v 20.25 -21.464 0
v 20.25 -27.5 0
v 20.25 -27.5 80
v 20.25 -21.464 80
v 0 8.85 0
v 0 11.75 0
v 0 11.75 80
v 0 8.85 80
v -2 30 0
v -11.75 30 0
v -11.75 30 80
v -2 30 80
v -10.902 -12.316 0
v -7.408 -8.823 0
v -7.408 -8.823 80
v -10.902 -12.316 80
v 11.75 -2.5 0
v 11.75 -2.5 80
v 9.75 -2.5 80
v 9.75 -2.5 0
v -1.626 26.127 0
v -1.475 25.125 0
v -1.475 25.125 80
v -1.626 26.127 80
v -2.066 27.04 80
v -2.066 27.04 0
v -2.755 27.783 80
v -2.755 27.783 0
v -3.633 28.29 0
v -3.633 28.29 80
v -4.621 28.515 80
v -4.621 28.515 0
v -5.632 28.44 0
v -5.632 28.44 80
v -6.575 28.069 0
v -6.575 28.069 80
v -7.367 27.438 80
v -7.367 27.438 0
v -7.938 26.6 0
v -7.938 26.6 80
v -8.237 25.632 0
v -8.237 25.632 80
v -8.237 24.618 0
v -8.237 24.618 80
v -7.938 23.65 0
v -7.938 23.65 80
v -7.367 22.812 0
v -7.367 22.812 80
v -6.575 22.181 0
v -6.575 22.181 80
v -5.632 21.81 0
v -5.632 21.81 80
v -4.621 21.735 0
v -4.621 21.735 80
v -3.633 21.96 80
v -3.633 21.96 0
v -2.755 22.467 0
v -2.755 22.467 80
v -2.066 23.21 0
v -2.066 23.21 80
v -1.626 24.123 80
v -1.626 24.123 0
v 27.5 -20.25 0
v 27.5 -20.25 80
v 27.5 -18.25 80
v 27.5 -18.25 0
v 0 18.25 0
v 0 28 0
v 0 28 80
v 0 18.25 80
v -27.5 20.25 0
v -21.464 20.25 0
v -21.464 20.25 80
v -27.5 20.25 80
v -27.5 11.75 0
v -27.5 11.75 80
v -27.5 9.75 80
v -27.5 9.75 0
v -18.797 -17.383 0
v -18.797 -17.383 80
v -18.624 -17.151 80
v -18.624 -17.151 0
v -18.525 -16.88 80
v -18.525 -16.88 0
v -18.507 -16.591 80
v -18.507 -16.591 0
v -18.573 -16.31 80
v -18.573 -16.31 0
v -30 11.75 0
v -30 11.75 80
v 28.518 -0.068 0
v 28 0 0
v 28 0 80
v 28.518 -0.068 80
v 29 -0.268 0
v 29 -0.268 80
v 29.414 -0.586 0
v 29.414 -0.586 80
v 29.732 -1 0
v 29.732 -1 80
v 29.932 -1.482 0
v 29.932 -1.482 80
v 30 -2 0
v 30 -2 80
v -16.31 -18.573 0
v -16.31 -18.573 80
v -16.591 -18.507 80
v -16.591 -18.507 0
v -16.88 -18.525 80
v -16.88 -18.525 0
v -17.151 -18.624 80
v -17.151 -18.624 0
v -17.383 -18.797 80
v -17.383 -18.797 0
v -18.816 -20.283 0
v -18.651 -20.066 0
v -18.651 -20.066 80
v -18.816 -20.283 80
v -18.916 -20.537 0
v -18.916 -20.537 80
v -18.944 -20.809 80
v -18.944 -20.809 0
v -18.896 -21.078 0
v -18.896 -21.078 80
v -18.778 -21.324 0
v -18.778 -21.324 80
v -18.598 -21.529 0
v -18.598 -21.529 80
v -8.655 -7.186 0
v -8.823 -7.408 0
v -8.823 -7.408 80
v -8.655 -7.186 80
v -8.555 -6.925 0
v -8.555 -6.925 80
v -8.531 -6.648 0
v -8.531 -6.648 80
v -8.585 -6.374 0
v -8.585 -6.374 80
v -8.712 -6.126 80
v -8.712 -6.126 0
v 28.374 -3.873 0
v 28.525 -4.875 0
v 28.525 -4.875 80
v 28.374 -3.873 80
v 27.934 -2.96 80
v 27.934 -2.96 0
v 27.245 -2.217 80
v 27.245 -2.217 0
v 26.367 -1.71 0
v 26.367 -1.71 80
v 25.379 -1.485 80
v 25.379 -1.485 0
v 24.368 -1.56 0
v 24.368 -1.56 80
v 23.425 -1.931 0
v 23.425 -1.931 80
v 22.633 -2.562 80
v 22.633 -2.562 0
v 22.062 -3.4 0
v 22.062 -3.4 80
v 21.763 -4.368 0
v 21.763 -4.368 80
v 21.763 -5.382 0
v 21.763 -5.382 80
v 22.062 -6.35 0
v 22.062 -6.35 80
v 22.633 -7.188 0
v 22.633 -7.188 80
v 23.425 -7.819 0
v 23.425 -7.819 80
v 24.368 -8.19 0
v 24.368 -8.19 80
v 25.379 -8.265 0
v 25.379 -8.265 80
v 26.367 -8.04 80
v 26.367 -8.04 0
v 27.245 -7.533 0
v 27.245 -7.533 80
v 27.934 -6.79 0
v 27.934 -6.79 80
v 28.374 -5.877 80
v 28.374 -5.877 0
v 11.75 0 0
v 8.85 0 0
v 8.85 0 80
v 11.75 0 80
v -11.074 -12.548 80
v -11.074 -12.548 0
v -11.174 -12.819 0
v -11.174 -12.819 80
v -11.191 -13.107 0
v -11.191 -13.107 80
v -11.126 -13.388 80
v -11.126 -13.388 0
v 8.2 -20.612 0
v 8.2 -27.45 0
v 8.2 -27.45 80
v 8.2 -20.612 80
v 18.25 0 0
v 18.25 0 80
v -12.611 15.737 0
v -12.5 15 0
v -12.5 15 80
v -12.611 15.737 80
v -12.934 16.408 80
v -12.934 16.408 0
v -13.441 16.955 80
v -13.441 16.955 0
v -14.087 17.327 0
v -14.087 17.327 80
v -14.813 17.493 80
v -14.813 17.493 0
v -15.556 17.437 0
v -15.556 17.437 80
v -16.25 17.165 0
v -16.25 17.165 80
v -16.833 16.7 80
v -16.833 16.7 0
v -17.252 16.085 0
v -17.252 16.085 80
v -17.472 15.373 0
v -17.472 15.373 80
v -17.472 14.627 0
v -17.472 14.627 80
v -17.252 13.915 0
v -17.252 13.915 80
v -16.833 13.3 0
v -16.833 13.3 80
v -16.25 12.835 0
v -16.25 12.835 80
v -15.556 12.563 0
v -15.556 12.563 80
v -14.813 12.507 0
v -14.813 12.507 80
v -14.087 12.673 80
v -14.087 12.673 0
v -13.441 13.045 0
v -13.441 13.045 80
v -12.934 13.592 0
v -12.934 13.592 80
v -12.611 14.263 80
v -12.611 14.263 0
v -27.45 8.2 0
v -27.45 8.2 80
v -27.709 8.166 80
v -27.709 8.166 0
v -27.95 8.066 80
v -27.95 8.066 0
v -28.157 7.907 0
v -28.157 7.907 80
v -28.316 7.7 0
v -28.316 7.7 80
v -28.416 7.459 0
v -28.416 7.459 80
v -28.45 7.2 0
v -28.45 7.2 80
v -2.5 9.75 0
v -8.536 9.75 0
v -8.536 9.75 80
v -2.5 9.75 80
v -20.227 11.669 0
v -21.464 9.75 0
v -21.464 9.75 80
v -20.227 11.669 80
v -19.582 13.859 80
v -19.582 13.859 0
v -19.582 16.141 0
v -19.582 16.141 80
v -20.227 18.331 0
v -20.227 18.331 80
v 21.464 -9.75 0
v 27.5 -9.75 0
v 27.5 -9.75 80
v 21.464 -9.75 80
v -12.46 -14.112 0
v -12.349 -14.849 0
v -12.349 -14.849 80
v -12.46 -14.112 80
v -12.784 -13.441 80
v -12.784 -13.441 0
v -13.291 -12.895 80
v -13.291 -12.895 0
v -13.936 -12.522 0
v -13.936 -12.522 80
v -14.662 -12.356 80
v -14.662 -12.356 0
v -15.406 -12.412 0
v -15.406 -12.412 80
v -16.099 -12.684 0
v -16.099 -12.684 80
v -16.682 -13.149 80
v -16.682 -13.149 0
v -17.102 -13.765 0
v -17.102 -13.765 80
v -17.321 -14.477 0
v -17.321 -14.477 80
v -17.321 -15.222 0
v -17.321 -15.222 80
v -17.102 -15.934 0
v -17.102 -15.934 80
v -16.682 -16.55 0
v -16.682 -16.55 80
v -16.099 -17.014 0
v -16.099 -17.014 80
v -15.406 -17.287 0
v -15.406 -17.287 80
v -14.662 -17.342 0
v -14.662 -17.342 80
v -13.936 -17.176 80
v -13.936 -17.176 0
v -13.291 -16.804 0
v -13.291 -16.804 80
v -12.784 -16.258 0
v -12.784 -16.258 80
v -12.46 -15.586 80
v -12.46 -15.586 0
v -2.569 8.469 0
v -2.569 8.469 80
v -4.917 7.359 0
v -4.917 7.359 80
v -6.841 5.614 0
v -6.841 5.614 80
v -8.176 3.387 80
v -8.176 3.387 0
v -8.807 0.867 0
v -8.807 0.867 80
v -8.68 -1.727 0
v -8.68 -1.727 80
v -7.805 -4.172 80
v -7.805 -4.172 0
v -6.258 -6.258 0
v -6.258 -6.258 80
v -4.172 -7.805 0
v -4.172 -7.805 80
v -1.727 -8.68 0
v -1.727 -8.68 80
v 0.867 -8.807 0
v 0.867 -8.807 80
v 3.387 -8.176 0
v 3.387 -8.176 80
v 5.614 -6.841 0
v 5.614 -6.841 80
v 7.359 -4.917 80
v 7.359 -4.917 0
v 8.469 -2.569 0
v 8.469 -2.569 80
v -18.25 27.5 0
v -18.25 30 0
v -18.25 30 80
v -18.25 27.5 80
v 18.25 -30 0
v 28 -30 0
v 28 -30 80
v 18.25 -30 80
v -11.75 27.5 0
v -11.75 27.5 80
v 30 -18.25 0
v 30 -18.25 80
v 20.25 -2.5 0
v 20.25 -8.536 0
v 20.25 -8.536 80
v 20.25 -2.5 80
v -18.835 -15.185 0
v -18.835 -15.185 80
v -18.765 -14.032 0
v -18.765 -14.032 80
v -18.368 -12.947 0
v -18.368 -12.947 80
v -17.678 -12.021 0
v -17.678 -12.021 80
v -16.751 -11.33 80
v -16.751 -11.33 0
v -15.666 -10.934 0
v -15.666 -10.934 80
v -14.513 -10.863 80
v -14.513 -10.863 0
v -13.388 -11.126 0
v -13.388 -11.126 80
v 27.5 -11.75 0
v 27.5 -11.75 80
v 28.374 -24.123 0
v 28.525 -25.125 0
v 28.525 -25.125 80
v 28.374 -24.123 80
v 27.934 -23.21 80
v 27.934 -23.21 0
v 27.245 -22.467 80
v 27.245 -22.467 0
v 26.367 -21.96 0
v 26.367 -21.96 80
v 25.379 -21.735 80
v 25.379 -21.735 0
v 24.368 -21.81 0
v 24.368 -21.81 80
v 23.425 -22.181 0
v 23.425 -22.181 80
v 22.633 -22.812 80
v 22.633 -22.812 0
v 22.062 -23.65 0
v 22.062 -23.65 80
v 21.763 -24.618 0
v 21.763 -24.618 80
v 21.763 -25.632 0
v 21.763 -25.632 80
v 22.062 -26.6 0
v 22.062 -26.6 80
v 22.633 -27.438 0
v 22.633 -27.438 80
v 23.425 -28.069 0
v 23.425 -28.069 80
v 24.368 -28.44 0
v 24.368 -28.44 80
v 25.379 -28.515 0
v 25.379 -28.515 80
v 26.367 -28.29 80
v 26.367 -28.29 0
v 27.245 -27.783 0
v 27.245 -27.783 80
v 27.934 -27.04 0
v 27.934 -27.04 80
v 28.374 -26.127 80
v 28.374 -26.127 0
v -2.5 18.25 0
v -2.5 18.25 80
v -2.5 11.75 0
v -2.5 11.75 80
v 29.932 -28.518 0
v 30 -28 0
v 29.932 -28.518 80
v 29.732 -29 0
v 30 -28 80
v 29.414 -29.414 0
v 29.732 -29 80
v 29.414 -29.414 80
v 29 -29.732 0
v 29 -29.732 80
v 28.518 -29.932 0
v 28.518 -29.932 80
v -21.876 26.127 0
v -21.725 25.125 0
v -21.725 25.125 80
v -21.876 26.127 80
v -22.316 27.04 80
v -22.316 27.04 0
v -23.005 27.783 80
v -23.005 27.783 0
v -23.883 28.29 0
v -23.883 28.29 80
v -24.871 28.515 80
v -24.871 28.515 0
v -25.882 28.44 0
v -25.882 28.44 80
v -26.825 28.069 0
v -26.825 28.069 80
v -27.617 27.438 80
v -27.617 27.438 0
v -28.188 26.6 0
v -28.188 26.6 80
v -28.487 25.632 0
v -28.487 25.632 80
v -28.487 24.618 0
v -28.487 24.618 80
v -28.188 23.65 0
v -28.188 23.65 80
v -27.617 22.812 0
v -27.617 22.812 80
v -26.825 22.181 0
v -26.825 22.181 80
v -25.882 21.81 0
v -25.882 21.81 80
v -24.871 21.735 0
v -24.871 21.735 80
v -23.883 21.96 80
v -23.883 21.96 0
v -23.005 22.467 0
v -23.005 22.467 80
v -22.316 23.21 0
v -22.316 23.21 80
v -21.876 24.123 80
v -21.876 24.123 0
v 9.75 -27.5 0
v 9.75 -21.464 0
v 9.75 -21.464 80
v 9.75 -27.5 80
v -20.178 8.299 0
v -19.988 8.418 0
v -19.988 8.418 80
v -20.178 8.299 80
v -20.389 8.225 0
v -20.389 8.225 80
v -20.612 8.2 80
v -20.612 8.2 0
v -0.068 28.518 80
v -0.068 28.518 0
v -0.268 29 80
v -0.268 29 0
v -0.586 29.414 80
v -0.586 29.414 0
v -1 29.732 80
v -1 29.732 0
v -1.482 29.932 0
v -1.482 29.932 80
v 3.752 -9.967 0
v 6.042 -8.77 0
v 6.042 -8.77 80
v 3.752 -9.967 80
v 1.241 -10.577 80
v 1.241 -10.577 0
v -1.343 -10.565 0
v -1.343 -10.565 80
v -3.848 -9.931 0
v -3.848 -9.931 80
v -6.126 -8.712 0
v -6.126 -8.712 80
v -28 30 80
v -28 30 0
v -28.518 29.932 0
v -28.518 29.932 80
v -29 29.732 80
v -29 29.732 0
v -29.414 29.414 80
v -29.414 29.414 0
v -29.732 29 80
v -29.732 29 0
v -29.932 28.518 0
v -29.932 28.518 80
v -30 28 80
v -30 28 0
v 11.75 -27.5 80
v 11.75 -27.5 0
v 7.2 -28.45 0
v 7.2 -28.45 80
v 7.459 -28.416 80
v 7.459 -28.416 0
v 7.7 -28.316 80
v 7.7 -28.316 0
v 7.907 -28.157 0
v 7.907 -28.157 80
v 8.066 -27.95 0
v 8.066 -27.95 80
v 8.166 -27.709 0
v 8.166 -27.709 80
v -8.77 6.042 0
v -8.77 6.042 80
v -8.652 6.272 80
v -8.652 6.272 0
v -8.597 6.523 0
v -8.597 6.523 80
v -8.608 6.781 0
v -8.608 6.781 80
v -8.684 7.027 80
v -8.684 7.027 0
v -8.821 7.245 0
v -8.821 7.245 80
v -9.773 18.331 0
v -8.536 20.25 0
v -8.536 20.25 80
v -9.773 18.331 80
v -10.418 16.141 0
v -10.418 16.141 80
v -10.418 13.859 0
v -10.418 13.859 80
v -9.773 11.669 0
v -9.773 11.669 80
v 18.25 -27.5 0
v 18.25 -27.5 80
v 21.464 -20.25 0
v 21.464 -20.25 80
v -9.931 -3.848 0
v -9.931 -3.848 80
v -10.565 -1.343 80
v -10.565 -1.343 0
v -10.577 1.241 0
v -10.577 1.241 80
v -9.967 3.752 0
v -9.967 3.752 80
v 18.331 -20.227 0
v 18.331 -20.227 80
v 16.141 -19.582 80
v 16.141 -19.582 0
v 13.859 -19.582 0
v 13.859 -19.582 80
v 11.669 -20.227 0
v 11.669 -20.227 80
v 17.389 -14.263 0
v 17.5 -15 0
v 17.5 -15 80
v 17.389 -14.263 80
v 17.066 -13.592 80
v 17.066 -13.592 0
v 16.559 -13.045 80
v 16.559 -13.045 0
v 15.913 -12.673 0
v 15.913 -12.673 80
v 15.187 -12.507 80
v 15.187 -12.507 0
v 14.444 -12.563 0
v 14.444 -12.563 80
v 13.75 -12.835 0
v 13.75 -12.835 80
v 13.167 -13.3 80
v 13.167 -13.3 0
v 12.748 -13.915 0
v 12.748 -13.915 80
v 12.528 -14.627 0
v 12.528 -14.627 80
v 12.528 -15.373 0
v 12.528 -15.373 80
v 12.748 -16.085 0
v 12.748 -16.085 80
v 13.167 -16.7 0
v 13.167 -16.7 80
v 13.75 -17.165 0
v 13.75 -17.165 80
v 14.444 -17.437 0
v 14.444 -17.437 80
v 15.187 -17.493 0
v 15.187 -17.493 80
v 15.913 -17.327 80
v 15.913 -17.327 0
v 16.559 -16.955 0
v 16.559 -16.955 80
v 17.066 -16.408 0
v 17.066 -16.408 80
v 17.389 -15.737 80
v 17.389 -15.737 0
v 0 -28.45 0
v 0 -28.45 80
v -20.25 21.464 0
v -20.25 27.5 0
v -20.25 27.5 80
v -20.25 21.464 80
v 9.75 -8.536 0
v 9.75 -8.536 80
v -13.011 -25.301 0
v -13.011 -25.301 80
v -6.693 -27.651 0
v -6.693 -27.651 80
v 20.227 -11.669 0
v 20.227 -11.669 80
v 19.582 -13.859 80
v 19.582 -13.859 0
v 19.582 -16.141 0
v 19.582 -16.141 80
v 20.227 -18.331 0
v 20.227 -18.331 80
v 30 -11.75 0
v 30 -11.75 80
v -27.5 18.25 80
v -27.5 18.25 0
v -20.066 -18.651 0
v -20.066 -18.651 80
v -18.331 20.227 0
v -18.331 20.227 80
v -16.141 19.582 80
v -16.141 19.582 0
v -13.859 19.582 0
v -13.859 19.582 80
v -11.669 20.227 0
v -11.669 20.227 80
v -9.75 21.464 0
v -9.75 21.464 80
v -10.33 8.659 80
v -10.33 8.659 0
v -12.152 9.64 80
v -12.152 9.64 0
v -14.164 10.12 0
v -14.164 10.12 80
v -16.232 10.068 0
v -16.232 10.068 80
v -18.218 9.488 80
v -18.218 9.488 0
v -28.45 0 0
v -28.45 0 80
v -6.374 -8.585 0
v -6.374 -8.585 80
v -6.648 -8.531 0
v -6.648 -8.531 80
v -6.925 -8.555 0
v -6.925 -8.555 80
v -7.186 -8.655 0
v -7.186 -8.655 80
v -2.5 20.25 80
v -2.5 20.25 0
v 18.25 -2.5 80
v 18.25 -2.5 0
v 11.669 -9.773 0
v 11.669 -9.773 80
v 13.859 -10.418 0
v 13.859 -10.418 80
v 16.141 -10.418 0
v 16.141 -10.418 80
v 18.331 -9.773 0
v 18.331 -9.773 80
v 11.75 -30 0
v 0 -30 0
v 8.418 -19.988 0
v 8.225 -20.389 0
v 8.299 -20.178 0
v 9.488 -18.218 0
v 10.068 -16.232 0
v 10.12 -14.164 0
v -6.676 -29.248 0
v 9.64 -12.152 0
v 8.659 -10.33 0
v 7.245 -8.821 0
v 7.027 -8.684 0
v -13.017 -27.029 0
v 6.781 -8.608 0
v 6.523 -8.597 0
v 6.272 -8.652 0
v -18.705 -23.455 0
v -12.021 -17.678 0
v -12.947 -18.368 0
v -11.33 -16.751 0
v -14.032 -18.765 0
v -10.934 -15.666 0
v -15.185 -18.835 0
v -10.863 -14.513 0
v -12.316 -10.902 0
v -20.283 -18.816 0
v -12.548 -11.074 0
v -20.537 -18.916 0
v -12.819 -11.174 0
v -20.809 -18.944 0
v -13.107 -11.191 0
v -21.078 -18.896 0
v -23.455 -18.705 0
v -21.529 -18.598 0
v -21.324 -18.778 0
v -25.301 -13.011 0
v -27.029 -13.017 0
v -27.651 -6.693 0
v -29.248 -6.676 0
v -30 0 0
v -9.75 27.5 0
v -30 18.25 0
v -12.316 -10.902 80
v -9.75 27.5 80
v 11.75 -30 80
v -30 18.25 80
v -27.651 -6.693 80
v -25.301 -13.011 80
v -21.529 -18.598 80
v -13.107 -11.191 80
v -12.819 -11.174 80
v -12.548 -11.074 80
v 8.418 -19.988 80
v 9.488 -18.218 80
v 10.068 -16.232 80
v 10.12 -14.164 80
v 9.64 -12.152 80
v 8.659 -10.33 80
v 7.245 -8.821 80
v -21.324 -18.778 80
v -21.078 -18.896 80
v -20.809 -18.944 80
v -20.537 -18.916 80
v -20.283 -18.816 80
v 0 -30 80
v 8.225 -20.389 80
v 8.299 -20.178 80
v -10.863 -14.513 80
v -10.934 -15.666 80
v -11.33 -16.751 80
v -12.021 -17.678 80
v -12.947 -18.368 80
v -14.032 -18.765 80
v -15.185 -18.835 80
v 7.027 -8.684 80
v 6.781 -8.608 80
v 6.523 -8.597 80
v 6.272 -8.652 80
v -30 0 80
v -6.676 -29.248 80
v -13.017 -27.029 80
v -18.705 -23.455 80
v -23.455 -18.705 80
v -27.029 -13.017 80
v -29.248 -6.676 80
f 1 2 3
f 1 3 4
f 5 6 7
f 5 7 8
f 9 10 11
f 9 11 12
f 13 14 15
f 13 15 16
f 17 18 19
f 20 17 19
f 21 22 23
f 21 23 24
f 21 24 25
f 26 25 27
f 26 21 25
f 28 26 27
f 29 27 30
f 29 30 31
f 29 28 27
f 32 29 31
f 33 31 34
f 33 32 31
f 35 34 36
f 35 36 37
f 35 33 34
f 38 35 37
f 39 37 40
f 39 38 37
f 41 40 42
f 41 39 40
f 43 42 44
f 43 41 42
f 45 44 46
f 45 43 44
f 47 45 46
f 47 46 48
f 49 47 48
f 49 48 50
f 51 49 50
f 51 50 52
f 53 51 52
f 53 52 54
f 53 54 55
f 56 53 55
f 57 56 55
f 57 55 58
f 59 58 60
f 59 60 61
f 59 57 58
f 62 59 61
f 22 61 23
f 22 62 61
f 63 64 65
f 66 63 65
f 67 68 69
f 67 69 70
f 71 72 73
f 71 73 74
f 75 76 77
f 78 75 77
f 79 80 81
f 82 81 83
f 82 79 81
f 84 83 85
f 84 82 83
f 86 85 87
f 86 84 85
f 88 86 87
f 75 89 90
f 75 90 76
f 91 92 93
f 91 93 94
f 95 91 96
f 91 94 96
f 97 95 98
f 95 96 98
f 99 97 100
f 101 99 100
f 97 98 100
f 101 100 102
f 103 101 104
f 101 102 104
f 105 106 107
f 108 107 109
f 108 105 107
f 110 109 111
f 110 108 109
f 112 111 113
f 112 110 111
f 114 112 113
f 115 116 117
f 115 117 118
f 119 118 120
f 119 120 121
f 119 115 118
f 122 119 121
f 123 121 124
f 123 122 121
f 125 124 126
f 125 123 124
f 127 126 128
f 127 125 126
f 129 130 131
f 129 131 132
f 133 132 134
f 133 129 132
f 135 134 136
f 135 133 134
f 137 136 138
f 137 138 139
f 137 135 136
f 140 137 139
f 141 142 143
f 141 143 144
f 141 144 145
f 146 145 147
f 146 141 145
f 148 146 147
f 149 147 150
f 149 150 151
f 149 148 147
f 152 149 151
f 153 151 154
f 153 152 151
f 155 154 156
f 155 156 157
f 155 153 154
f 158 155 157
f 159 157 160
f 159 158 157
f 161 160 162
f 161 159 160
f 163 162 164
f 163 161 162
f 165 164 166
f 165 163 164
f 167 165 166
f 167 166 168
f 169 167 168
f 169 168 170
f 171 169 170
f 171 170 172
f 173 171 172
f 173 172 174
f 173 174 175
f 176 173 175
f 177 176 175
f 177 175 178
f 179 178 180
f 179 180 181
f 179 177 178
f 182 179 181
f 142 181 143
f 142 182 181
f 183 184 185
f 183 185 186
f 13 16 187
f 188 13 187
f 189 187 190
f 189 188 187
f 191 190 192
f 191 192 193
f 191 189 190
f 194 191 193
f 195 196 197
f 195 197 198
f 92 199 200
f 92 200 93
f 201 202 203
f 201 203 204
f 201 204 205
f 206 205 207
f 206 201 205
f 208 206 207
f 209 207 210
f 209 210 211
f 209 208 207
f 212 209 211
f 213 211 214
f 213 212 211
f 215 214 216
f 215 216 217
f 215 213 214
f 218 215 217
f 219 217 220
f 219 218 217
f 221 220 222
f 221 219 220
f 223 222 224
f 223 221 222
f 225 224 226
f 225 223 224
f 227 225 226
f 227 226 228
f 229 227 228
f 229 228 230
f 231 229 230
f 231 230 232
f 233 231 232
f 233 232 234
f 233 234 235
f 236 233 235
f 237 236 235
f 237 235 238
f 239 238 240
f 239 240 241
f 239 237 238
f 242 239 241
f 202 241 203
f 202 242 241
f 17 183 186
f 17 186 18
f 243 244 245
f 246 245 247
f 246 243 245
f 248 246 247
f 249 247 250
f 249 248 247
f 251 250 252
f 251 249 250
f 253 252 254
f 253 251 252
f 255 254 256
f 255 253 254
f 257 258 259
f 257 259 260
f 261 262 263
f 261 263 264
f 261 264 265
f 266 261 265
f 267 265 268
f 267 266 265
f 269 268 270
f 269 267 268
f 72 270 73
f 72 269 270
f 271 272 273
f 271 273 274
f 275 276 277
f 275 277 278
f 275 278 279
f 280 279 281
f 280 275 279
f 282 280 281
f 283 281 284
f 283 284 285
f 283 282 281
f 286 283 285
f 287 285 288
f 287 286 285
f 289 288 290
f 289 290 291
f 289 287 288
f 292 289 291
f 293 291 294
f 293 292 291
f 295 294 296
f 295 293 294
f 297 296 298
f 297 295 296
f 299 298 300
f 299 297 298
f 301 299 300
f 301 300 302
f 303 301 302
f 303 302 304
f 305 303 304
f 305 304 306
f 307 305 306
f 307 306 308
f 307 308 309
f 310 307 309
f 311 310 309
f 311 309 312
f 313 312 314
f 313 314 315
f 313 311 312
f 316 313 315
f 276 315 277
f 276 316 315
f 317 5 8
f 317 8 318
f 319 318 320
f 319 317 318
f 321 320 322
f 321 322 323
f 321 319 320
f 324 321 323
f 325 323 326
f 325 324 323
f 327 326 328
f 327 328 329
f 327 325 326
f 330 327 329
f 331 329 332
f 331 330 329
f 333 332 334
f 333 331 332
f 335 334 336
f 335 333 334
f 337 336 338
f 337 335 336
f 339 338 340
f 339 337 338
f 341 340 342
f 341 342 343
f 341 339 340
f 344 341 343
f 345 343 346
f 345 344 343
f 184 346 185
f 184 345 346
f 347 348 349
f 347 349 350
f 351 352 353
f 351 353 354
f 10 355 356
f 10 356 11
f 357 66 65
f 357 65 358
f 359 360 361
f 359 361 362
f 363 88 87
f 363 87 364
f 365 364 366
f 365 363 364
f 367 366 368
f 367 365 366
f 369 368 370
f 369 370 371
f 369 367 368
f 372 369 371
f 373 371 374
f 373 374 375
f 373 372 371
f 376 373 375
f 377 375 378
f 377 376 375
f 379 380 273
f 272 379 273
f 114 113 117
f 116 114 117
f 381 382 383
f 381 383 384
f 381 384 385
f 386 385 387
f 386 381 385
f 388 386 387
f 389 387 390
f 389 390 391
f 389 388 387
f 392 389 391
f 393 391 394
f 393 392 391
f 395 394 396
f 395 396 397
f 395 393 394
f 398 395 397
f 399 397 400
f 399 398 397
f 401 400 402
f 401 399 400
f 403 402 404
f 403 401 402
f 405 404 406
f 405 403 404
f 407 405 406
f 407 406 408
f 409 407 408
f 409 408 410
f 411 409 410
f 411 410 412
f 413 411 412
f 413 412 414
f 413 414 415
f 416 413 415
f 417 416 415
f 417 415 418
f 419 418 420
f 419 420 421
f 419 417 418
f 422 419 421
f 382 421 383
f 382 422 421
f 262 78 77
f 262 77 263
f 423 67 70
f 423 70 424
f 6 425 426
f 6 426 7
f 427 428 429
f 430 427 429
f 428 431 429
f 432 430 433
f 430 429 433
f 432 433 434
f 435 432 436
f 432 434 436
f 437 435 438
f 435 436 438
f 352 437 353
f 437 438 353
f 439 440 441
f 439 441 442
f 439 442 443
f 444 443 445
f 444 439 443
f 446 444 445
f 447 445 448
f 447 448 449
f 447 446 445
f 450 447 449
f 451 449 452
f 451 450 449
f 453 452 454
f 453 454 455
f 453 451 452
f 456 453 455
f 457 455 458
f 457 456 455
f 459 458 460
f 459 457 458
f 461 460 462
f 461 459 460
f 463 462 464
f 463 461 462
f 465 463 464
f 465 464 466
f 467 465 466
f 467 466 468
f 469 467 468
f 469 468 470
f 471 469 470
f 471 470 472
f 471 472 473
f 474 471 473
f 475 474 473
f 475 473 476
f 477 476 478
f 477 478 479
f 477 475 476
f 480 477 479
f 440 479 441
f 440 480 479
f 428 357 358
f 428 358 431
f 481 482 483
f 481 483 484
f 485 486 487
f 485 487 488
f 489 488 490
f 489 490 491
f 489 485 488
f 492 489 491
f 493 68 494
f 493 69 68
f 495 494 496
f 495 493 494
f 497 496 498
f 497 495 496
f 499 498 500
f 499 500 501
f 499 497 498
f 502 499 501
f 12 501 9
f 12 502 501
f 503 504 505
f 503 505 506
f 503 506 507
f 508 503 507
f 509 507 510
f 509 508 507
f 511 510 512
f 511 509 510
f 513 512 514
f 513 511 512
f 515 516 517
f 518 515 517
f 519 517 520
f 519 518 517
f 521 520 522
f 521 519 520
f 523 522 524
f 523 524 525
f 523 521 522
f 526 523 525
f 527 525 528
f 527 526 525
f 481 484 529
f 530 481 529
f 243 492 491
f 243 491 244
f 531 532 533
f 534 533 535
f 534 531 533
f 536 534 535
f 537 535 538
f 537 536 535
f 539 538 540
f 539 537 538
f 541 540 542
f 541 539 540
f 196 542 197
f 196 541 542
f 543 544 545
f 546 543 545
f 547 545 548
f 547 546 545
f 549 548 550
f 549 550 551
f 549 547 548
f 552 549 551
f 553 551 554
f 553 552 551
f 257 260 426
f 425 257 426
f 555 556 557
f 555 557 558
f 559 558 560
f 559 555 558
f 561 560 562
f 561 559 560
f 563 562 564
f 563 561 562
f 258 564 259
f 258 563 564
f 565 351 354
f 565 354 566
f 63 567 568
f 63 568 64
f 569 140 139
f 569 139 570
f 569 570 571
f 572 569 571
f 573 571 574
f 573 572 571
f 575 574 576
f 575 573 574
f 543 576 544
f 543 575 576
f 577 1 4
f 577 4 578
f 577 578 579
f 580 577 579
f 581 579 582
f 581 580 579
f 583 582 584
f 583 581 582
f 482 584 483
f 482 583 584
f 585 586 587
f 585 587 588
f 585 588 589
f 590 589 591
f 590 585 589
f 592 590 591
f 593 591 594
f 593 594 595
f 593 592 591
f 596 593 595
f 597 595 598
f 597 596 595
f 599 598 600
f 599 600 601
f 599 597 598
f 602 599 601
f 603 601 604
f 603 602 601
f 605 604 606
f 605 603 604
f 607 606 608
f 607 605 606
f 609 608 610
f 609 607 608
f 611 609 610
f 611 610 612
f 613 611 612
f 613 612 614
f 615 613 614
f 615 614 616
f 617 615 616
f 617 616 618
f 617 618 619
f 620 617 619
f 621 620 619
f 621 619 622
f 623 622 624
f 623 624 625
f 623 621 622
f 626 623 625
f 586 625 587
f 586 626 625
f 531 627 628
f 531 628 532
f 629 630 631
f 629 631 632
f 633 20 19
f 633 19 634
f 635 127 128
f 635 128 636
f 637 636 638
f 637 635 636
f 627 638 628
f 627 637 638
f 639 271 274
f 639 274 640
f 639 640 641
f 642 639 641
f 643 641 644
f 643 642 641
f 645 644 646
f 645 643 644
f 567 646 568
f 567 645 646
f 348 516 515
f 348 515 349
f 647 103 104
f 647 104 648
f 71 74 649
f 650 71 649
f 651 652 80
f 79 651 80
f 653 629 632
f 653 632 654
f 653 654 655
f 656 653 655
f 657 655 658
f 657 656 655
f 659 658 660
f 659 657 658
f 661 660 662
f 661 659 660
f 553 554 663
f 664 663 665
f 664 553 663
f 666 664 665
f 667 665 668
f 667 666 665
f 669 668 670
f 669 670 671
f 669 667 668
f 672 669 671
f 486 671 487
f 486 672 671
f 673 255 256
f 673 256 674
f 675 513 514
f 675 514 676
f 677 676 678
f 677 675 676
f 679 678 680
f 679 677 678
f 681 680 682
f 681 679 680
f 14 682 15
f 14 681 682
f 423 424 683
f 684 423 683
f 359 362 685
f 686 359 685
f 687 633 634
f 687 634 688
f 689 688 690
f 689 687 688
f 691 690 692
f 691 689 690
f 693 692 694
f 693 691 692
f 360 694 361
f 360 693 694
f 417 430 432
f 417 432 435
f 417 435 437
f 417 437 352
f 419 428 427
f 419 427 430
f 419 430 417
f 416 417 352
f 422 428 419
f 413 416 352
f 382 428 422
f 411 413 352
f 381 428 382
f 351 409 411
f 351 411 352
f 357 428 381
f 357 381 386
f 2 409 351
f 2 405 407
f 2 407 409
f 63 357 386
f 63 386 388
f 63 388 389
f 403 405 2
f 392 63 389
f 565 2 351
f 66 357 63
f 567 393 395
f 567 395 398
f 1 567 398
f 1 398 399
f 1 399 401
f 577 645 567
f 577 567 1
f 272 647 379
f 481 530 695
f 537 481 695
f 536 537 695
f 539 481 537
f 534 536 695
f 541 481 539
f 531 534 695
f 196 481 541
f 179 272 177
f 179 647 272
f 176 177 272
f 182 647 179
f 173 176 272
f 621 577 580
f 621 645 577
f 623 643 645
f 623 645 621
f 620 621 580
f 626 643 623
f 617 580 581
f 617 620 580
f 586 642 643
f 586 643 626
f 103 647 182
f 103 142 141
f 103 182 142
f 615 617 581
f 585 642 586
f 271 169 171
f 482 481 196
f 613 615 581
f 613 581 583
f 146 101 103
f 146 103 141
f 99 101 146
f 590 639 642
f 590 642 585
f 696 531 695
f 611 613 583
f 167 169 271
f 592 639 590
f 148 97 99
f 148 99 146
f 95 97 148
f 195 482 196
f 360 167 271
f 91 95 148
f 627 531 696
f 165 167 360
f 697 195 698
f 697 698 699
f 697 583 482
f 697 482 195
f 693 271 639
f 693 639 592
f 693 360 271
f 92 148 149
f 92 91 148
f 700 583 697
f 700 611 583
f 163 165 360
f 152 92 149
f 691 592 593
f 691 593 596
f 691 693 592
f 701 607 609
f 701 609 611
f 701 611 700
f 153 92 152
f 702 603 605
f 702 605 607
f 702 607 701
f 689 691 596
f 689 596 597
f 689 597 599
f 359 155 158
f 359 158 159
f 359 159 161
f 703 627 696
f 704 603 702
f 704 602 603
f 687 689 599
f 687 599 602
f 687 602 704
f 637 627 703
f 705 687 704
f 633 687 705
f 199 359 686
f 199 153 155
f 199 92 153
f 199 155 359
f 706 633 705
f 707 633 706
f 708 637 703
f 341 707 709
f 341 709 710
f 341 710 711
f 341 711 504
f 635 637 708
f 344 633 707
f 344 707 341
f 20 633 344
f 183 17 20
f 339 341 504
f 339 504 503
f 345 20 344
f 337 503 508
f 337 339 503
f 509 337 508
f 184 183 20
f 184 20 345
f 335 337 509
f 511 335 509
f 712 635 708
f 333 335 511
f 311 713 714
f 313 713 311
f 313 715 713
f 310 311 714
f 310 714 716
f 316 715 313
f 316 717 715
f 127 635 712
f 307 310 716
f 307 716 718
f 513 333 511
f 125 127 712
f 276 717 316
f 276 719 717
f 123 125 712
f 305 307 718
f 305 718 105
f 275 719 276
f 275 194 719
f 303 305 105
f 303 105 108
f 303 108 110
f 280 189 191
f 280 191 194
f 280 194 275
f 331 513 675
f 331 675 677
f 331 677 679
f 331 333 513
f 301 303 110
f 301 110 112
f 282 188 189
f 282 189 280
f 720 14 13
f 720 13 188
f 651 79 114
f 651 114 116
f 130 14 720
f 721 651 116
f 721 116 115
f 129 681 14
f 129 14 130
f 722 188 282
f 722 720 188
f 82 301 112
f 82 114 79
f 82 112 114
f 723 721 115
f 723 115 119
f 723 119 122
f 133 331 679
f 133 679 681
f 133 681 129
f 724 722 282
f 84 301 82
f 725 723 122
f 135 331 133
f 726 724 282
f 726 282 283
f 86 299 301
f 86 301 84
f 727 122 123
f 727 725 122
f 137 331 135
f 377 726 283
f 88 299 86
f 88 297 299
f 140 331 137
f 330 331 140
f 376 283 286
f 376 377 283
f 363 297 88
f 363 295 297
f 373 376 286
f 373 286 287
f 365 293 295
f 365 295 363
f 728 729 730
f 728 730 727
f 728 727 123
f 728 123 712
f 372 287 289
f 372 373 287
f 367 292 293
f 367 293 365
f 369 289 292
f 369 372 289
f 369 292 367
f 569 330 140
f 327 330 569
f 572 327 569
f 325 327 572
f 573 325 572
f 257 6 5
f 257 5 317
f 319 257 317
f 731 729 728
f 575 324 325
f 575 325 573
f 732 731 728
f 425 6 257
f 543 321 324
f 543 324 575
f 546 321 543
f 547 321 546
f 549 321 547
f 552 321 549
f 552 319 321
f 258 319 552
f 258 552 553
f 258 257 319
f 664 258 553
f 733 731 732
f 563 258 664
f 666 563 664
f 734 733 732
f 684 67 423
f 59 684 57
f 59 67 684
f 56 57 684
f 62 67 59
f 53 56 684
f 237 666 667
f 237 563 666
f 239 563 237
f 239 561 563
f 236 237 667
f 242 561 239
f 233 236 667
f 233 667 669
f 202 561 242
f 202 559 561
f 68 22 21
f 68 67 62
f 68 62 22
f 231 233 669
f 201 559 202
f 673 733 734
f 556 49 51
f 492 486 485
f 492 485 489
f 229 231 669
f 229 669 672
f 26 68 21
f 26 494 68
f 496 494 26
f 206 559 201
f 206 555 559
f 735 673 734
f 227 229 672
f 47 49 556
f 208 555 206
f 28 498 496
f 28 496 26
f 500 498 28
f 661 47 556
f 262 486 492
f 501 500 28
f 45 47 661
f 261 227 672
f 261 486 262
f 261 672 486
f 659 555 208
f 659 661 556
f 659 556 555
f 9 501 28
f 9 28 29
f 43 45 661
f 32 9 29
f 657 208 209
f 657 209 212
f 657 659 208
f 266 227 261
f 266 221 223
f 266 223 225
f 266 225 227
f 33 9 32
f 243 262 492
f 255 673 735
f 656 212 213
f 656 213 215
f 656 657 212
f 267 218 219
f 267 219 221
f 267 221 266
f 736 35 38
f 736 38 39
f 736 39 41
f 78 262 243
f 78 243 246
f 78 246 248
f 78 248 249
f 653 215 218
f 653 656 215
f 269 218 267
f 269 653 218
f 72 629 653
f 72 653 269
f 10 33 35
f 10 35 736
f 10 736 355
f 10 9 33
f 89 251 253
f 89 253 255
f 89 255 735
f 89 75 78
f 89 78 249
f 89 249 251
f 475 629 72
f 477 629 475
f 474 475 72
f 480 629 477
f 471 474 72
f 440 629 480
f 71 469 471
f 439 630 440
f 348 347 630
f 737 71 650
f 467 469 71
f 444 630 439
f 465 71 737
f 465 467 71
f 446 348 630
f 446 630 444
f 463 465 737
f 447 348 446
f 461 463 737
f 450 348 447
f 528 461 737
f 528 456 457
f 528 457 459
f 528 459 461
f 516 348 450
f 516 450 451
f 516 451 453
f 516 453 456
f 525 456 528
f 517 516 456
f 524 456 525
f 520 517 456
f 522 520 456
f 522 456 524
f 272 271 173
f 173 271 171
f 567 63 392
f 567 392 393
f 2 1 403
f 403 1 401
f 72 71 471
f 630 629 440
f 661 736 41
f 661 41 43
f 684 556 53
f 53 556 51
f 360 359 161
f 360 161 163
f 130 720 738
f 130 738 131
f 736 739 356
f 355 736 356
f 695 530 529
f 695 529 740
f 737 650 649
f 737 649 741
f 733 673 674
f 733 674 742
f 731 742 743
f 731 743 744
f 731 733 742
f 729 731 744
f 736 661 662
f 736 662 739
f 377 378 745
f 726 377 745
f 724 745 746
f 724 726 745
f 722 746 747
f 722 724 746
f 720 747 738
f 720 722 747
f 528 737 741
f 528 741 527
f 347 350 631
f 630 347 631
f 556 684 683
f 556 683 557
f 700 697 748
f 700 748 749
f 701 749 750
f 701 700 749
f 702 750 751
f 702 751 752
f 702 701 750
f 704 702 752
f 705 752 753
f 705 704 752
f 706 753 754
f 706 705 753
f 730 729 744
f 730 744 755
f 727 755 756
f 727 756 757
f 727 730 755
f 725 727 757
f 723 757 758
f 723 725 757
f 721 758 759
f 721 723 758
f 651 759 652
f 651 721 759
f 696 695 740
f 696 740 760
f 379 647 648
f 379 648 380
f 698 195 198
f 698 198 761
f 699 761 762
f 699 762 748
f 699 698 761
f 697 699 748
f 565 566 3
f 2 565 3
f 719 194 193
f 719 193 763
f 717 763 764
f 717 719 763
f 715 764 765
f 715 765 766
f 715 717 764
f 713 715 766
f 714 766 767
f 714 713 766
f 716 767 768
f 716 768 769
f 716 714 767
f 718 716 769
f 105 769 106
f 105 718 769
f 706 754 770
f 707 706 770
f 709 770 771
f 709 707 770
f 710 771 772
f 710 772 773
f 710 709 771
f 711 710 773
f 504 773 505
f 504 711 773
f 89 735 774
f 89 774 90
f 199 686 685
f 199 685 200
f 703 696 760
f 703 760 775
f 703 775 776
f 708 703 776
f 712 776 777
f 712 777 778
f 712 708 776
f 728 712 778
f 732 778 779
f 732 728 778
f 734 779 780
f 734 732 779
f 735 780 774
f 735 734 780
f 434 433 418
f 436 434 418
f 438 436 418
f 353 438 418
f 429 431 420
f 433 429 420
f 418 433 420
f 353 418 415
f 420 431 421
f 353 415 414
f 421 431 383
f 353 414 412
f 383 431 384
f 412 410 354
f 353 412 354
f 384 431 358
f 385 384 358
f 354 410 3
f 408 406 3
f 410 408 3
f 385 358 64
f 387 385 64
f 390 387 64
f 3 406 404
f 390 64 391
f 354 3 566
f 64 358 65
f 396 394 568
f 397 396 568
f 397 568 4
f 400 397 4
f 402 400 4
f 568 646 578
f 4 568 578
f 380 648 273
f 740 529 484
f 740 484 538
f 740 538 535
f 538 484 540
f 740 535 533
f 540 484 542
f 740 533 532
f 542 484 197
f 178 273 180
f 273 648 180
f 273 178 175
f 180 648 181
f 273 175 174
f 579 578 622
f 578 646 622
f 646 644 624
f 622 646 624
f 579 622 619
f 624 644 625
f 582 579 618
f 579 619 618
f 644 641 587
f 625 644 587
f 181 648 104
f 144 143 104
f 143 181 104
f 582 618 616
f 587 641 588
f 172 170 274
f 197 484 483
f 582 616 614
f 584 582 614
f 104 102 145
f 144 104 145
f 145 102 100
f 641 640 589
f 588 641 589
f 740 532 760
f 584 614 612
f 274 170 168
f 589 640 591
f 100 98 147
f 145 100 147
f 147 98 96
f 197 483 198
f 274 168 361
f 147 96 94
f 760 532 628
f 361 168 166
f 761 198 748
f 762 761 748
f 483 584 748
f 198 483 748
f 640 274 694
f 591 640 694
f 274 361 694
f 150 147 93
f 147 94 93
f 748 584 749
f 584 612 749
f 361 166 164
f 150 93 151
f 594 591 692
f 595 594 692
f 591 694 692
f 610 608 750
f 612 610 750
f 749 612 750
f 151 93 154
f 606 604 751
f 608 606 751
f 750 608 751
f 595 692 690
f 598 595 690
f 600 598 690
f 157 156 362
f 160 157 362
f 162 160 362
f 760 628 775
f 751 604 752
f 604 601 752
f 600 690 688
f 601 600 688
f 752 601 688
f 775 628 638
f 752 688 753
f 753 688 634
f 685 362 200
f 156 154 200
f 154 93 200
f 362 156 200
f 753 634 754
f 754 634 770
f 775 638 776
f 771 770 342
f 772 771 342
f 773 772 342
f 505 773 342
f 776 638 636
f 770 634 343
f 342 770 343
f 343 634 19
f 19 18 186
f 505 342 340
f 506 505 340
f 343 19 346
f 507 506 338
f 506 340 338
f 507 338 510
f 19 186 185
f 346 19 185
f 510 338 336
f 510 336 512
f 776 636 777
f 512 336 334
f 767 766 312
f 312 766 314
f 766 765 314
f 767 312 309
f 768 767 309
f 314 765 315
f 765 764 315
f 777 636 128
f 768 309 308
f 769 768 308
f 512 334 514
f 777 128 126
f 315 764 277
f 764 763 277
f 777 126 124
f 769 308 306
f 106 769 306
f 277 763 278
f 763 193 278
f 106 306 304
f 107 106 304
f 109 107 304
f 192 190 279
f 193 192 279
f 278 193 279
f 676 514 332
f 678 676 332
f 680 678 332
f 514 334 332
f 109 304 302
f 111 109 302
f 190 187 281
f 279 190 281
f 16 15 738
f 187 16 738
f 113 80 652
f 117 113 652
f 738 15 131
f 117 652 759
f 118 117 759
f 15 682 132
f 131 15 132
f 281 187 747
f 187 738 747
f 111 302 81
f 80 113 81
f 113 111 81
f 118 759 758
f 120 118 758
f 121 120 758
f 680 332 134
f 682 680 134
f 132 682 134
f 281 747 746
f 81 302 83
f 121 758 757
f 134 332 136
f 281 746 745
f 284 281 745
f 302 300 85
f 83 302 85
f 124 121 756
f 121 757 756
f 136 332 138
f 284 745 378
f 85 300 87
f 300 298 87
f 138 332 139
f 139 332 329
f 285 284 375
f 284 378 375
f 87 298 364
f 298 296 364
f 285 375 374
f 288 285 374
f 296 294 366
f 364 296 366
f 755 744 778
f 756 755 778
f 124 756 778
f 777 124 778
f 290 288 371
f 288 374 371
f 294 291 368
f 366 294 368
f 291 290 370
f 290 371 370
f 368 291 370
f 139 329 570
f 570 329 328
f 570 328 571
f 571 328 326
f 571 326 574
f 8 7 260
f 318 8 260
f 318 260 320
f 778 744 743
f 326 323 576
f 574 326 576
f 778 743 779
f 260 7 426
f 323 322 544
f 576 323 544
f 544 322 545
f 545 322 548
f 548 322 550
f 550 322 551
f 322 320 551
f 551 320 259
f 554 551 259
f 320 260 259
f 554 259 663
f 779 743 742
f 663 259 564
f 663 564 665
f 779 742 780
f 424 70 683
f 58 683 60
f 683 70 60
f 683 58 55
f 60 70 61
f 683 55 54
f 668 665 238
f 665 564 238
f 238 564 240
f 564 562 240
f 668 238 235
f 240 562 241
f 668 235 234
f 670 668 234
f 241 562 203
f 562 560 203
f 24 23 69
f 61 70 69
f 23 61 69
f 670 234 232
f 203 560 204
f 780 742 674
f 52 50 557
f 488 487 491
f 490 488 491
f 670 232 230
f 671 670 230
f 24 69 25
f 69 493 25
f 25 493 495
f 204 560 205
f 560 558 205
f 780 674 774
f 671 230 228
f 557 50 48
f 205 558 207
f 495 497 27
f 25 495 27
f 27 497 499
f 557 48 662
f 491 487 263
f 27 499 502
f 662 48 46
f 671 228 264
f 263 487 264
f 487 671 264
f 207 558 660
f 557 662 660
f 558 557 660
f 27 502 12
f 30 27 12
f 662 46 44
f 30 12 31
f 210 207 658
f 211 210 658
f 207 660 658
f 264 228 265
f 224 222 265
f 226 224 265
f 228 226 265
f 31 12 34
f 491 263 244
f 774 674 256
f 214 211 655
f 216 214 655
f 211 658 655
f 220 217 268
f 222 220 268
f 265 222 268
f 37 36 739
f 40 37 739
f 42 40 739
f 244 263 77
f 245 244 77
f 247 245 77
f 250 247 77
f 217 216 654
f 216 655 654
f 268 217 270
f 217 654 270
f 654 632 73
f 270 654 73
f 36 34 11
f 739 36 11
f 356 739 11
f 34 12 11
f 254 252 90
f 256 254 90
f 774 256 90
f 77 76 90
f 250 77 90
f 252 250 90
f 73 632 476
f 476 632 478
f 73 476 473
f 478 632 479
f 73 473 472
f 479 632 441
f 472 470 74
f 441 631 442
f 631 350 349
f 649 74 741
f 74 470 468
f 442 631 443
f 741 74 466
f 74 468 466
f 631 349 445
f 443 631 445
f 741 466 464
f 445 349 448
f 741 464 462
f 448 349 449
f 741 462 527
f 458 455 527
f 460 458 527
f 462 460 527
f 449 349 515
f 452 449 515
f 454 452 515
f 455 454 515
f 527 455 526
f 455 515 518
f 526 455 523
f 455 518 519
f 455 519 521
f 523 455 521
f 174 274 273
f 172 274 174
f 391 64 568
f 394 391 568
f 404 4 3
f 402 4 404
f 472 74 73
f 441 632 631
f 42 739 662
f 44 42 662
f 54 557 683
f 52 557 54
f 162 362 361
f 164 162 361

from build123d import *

# Parameters (mm, degrees)
IZIM1_R                     = 3.4
IZIM1_R_2                   = 2.5
Y_KSEKLIK_EKSTR_ZYON1_DEPTH = 80
FILLET1_R                   = 2


with BuildPart() as part:
    # Çizim1 → Yükseklik-Ekstrüzyon1 (new body)
    with BuildSketch(Plane.XY):
        with BuildLine():
            Line((18.25, 0), (30, 0))
            Line((30, 0), (30, -11.75))
            Line((30, -11.75), (27.5, -11.75))
            Line((27.5, -11.75), (27.5, -9.75))
            Line((27.5, -9.75), (21.463651766, -9.75))
            ThreePointArc((21.463651766, -9.75), (19.5, -15), (21.463651766, -20.25))
            Line((21.463651766, -20.25), (27.5, -20.25))
            Line((27.5, -20.25), (27.5, -18.25))
            Line((27.5, -18.25), (30, -18.25))
            Line((30, -18.25), (30, -30))
            Line((30, -30), (18.25, -30))
            Line((18.25, -30), (18.25, -27.5))
            Line((18.25, -27.5), (20.25, -27.5))
            Line((20.25, -27.5), (20.25, -21.463651766))
            ThreePointArc((20.25, -21.463651766), (15, -19.5), (9.75, -21.463651766))
            Line((9.75, -21.463651766), (9.75, -27.5))
            Line((9.75, -27.5), (11.75, -27.5))
            Line((11.75, -27.5), (11.75, -30))
            Line((11.75, -30), (0, -30))
            ThreePointArc((0, -30), (-21.213203436, -21.213203436), (-30, 0))
            Line((-30, 0), (-30, 11.75))
            Line((-30, 11.75), (-27.5, 11.75))
            Line((-27.5, 11.75), (-27.5, 9.75))
            Line((-27.5, 9.75), (-21.463651766, 9.75))
            ThreePointArc((-21.463651766, 9.75), (-19.5, 15), (-21.463651766, 20.25))
            Line((-21.463651766, 20.25), (-27.5, 20.25))
            Line((-27.5, 20.25), (-27.5, 18.25))
            Line((-27.5, 18.25), (-30, 18.25))
            Line((-30, 18.25), (-30, 30))
            Line((-30, 30), (-18.25, 30))
            Line((-18.25, 30), (-18.25, 27.5))
            Line((-18.25, 27.5), (-20.25, 27.5))
            Line((-20.25, 27.5), (-20.25, 21.463651766))
            ThreePointArc((-20.25, 21.463651766), (-15, 19.5), (-9.75, 21.463651766))
            Line((-9.75, 21.463651766), (-9.75, 27.5))
            Line((-9.75, 27.5), (-11.75, 27.5))
            Line((-11.75, 27.5), (-11.75, 30))
            Line((-11.75, 30), (0, 30))
            Line((0, 30), (0, 18.25))
            Line((0, 18.25), (-2.5, 18.25))
            Line((-2.5, 18.25), (-2.5, 20.25))
            Line((-2.5, 20.25), (-8.536348234, 20.25))
            ThreePointArc((-8.536348234, 20.25), (-10.5, 15), (-8.536348234, 9.75))
            Line((-8.536348234, 9.75), (-2.5, 9.75))
            Line((-2.5, 9.75), (-2.5, 11.75))
            Line((-2.5, 11.75), (0, 11.75))
            Line((0, 11.75), (0, 8.85))
            ThreePointArc((0, 8.85), (-6.257895014, -6.257895014), (8.85, 0))
            Line((8.85, 0), (11.75, 0))
            Line((11.75, 0), (11.75, -2.5))
            Line((11.75, -2.5), (9.75, -2.5))
            Line((9.75, -2.5), (9.75, -8.536348234))
            ThreePointArc((9.75, -8.536348234), (15, -10.5), (20.25, -8.536348234))
            Line((20.25, -8.536348234), (20.25, -2.5))
            Line((20.25, -2.5), (18.25, -2.5))
            Line((18.25, -2.5), (18.25, 0))
        make_face()
        with Locations((25.125, -4.875)):
            Circle(IZIM1_R, mode=Mode.SUBTRACT)
        with Locations((25.125, -25.125)):
            Circle(IZIM1_R, mode=Mode.SUBTRACT)
        with Locations((15, -15)):
            Circle(IZIM1_R_2, mode=Mode.SUBTRACT)
        with Locations((-14.849242405, -14.849242405)):
            Circle(IZIM1_R_2, mode=Mode.SUBTRACT)
        with Locations((-4.875, 25.125)):
            Circle(IZIM1_R, mode=Mode.SUBTRACT)
        with Locations((-25.125, 25.125)):
            Circle(IZIM1_R, mode=Mode.SUBTRACT)
        with Locations((-15, 15)):
            Circle(IZIM1_R_2, mode=Mode.SUBTRACT)
        with BuildLine():
            Line((-17.382505973, -18.796719535), (-18.651386187, -20.065599749))
            ThreePointArc((-18.651386187, -20.065599749), (-18.943614734, -20.809160633), (-18.597987217, -21.529453581))
            ThreePointArc((-18.597987217, -21.529453581), (-9.921933925, -26.663790563), (0, -28.45))
            Line((0, -28.45), (7.2, -28.45))
            ThreePointArc((7.2, -28.45), (7.907106781, -28.157106781), (8.2, -27.45))
            Line((8.2, -27.45), (8.2, -20.611577633))
            ThreePointArc((8.2, -20.611577633), (8.256120646, -20.281287208), (8.41818353, -19.988069007))
            ThreePointArc((8.41818353, -19.988069007), (10.119864462, -14.164129468), (7.244983946, -8.820998197))
            ThreePointArc((7.244983946, -8.820998197), (6.652264712, -8.594274715), (6.042451121, -8.769907893))
            ThreePointArc((6.042451121, -8.769907893), (-0.050937117, -10.649878188), (-6.126063635, -8.711707315))
            ThreePointArc((-6.126063635, -8.711707315), (-6.787438159, -8.533426454), (-7.408387658, -8.822601221))
            Line((-7.408387658, -8.822601221), (-10.901765275, -12.315978837))
            ThreePointArc((-10.901765275, -12.315978837), (-11.173564806, -12.818775974), (-11.125575276, -13.388316975))
            ThreePointArc((-11.125575276, -13.388316975), (-12.02081528, -17.67766953), (-16.310167834, -18.572909534))
            ThreePointArc((-16.310167834, -18.572909534), (-16.879708835, -18.524920004), (-17.382505973, -18.796719535))
        make_face(mode=Mode.SUBTRACT)
        with BuildLine():
            Line((-12.315978837, -10.901765275), (-8.822601221, -7.408387658))
            ThreePointArc((-8.822601221, -7.408387658), (-8.533426454, -6.787438159), (-8.711707315, -6.126063635))
            ThreePointArc((-8.711707315, -6.126063635), (-10.649878188, -0.050937117), (-8.769907893, 6.042451121))
            ThreePointArc((-8.769907893, 6.042451121), (-8.594274715, 6.652264712), (-8.820998197, 7.244983946))
            ThreePointArc((-8.820998197, 7.244983946), (-14.164129468, 10.119864462), (-19.988069007, 8.41818353))
            ThreePointArc((-19.988069007, 8.41818353), (-20.281287208, 8.256120646), (-20.611577633, 8.2))
            Line((-20.611577633, 8.2), (-27.45, 8.2))
            ThreePointArc((-27.45, 8.2), (-28.157106781, 7.907106781), (-28.45, 7.2))
            Line((-28.45, 7.2), (-28.45, 0))
            ThreePointArc((-28.45, 0), (-26.663790563, -9.921933925), (-21.529453581, -18.597987217))
            ThreePointArc((-21.529453581, -18.597987217), (-20.809160633, -18.943614734), (-20.065599749, -18.651386187))
            Line((-20.065599749, -18.651386187), (-18.796719535, -17.382505973))
            ThreePointArc((-18.796719535, -17.382505973), (-18.524920004, -16.879708835), (-18.572909534, -16.310167834))
            ThreePointArc((-18.572909534, -16.310167834), (-17.67766953, -12.02081528), (-13.388316975, -11.125575276))
            ThreePointArc((-13.388316975, -11.125575276), (-12.818775974, -11.173564806), (-12.315978837, -10.901765275))
        make_face(mode=Mode.SUBTRACT)
    extrude(amount=Y_KSEKLIK_EKSTR_ZYON1_DEPTH)

    # Fillet1
    fillet1_edges = [part.edges().sort_by_distance(p)[0] for p in [
        (-30, 30, 40),
        (0, 30, 40),
        (30, 0, 40),
        (30, -30, 40),
    ]]
    fillet(fillet1_edges, radius=FILLET1_R)


solid = part.part
